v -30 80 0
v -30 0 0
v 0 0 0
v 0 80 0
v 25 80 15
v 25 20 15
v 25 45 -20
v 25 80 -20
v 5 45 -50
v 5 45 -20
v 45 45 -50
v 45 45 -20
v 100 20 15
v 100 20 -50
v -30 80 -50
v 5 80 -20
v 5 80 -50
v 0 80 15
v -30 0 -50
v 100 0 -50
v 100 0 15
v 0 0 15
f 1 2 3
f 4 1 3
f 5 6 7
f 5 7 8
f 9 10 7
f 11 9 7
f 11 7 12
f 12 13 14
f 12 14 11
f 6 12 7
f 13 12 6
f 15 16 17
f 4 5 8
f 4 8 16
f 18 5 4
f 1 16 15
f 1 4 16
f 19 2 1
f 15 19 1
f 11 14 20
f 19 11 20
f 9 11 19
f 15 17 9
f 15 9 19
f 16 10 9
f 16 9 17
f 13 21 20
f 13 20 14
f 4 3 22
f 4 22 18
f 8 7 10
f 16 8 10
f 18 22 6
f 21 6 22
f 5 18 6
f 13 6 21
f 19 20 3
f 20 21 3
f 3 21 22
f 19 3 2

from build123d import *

# Parameters (mm, degrees)
SKETCH1_W           = 30
SKETCH1_H           = 80
BOSS_EXTRUDE1_DEPTH = 50
BOSS_EXTRUDE2_DEPTH = 15
BOSS_EXTRUDE3_DEPTH = 20
SKETCH2_W           = 25
SKETCH2_H           = 45
BOSS_EXTRUDE4_DEPTH = 30
SKETCH3_W           = 75
SKETCH3_H           = 25
BOSS_EXTRUDE7_DEPTH = 65
SKETCH7_W           = 75
SKETCH7_H           = 20
BOSS_EXTRUDE8_DEPTH = 30
CUT_EXTRUDE6_DEPTH  = 144.614066163
CUT_EXTRUDE7_DEPTH  = 75
SKETCH11_W          = 5
SKETCH11_H          = 35
BOSS_EXTRUDE9_DEPTH = 30


with BuildPart() as part:
    # Sketch1 → Boss-Extrude1 (new body)
    with BuildSketch(Plane.XY):
        with Locations((-15, 40)):
            Rectangle(SKETCH1_W, SKETCH1_H)
    extrude(amount=-BOSS_EXTRUDE1_DEPTH)



with BuildPart() as body_2:
    # Sketch1<3> → Boss-Extrude2 (new body)
    with BuildSketch(Plane.XY):
        Polygon((0, 80), (0, 0), (100, 0), (100, 20), (25, 20), (25, 80), align=None)
    extrude(amount=BOSS_EXTRUDE2_DEPTH)


with BuildPart() as part_1:
    add(part.part)

    add(body_2.part)  # Boss-Extrude3 merges body 2
    # Sketch1<4> → Boss-Extrude3 (add)
    with BuildSketch(Plane.XY):
        Polygon((0, 80), (0, 0), (100, 0), (100, 20), (25, 20), (25, 80), align=None)
    extrude(amount=-BOSS_EXTRUDE3_DEPTH)

    # Sketch2 → Boss-Extrude4 (add)
    with BuildSketch(Plane(origin=(0, 0, -20), x_dir=(-1, 0, 0), z_dir=(0, 0, -1))):
        with Locations((-12.5, 22.5)):
            Rectangle(SKETCH2_W, SKETCH2_H)
    extrude(amount=BOSS_EXTRUDE4_DEPTH)

    # Sketch3 → Boss-Extrude7 (add)
    with BuildSketch(Plane.XY.offset(15)):
        with Locations((62.5, 32.5)):
            Rectangle(SKETCH3_W, SKETCH3_H)
    extrude(amount=-BOSS_EXTRUDE7_DEPTH)

    # Sketch7 → Boss-Extrude8 (add)
    with BuildSketch(Plane(origin=(0, 0, -20), x_dir=(-1, 0, 0), z_dir=(0, 0, -1))):
        with Locations((-62.5, 10)):
            Rectangle(SKETCH7_W, SKETCH7_H)
    extrude(amount=BOSS_EXTRUDE8_DEPTH)

    # Sketch8 → Cut-Extrude6 (cut, through all)
    with BuildSketch(Plane.XY.offset(15)):
        Polygon((100, 45), (100, 20), (45, 45), align=None)
    extrude(amount=-CUT_EXTRUDE6_DEPTH, mode=Mode.SUBTRACT)

    # Sketch9 → Cut-Extrude7 (cut)
    with BuildSketch(Plane(origin=(100, 0, 0), x_dir=(0, 0, -1), z_dir=(1, 0, 0))):
        Polygon((-15, 45), (20, 45), (-15, 20), align=None)
    extrude(amount=-CUT_EXTRUDE7_DEPTH, mode=Mode.SUBTRACT)

    # Sketch11 → Boss-Extrude9 (add)
    with BuildSketch(Plane(origin=(0, 0, -20), x_dir=(-1, 0, 0), z_dir=(0, 0, -1))):
        with Locations((-2.5, 62.5)):
            Rectangle(SKETCH11_W, SKETCH11_H)
    extrude(amount=BOSS_EXTRUDE9_DEPTH)


solid = part_1.part
